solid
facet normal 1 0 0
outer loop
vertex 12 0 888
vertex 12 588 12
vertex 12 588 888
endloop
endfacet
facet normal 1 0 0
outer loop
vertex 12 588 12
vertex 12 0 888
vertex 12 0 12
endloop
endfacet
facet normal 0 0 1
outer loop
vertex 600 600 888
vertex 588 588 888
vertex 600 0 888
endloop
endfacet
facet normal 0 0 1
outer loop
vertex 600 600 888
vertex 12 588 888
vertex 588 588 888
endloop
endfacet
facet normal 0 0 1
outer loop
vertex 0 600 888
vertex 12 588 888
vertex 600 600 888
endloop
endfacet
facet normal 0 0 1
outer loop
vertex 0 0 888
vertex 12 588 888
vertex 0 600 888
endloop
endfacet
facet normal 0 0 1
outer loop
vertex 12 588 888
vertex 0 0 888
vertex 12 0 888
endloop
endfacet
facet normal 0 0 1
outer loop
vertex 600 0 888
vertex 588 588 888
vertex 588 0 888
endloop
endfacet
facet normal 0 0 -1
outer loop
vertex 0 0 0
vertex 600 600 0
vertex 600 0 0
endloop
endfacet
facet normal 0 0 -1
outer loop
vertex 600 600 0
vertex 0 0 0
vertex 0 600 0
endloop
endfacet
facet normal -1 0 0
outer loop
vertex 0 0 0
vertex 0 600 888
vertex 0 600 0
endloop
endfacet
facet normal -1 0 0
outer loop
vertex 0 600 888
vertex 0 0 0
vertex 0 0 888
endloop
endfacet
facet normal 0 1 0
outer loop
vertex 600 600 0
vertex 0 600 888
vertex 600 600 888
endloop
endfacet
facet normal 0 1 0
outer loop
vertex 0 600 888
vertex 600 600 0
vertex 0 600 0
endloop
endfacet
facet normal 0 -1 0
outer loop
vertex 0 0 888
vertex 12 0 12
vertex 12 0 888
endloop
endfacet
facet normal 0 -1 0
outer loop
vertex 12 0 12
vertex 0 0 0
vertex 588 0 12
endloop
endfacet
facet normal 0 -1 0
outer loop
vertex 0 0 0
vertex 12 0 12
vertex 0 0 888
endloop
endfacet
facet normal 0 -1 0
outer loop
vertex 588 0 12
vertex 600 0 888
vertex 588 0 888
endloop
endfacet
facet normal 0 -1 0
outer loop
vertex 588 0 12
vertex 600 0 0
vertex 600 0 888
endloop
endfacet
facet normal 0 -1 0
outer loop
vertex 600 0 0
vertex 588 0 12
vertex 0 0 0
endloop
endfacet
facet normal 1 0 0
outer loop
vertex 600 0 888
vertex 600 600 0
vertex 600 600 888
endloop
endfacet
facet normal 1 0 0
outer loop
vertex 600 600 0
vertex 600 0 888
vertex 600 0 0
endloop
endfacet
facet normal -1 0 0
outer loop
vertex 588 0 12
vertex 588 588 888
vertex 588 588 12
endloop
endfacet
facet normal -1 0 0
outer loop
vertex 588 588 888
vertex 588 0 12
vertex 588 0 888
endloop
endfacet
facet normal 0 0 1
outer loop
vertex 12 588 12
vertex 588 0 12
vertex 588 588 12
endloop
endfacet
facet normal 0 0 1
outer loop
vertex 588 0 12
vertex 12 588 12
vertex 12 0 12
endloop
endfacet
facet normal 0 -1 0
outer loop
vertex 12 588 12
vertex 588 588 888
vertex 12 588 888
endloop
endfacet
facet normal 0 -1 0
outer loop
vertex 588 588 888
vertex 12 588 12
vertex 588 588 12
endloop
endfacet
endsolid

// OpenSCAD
/*

    Cabinet
    
    By Anton Augustsson


*/

module cabinet (
    thickness,
    length,
    width,
    height
    ){
/*
    ---------- Local varibles ---------- 
*/



/*
    ---------- Code ---------- 
*/


union () {

// Left
translate([
    0,
    0,
    0]) 
cube(size = [
    thickness,
    width,
    height-thickness]);

// Right
translate([
    length-thickness,
    0,
    0]) 
cube(size = [
    thickness,
    width,
    height-thickness]);
    
// Bottom 
translate([
    thickness,
    0,
    0]) 
cube(size = [
    length
    -thickness*2,
    width-thickness,
    thickness]);

// Back
translate([
    thickness,
    width-thickness,
    0]) 
cube(size = [
    length
    -thickness*2,
    thickness,
    height-thickness]);
}}



/*
    ---------- Example ---------- 
*/


thickness = 12;

length = 600;
width  = 600;
height = 900;

cabinet (
    thickness,
    length,
    width,
    height
    );
